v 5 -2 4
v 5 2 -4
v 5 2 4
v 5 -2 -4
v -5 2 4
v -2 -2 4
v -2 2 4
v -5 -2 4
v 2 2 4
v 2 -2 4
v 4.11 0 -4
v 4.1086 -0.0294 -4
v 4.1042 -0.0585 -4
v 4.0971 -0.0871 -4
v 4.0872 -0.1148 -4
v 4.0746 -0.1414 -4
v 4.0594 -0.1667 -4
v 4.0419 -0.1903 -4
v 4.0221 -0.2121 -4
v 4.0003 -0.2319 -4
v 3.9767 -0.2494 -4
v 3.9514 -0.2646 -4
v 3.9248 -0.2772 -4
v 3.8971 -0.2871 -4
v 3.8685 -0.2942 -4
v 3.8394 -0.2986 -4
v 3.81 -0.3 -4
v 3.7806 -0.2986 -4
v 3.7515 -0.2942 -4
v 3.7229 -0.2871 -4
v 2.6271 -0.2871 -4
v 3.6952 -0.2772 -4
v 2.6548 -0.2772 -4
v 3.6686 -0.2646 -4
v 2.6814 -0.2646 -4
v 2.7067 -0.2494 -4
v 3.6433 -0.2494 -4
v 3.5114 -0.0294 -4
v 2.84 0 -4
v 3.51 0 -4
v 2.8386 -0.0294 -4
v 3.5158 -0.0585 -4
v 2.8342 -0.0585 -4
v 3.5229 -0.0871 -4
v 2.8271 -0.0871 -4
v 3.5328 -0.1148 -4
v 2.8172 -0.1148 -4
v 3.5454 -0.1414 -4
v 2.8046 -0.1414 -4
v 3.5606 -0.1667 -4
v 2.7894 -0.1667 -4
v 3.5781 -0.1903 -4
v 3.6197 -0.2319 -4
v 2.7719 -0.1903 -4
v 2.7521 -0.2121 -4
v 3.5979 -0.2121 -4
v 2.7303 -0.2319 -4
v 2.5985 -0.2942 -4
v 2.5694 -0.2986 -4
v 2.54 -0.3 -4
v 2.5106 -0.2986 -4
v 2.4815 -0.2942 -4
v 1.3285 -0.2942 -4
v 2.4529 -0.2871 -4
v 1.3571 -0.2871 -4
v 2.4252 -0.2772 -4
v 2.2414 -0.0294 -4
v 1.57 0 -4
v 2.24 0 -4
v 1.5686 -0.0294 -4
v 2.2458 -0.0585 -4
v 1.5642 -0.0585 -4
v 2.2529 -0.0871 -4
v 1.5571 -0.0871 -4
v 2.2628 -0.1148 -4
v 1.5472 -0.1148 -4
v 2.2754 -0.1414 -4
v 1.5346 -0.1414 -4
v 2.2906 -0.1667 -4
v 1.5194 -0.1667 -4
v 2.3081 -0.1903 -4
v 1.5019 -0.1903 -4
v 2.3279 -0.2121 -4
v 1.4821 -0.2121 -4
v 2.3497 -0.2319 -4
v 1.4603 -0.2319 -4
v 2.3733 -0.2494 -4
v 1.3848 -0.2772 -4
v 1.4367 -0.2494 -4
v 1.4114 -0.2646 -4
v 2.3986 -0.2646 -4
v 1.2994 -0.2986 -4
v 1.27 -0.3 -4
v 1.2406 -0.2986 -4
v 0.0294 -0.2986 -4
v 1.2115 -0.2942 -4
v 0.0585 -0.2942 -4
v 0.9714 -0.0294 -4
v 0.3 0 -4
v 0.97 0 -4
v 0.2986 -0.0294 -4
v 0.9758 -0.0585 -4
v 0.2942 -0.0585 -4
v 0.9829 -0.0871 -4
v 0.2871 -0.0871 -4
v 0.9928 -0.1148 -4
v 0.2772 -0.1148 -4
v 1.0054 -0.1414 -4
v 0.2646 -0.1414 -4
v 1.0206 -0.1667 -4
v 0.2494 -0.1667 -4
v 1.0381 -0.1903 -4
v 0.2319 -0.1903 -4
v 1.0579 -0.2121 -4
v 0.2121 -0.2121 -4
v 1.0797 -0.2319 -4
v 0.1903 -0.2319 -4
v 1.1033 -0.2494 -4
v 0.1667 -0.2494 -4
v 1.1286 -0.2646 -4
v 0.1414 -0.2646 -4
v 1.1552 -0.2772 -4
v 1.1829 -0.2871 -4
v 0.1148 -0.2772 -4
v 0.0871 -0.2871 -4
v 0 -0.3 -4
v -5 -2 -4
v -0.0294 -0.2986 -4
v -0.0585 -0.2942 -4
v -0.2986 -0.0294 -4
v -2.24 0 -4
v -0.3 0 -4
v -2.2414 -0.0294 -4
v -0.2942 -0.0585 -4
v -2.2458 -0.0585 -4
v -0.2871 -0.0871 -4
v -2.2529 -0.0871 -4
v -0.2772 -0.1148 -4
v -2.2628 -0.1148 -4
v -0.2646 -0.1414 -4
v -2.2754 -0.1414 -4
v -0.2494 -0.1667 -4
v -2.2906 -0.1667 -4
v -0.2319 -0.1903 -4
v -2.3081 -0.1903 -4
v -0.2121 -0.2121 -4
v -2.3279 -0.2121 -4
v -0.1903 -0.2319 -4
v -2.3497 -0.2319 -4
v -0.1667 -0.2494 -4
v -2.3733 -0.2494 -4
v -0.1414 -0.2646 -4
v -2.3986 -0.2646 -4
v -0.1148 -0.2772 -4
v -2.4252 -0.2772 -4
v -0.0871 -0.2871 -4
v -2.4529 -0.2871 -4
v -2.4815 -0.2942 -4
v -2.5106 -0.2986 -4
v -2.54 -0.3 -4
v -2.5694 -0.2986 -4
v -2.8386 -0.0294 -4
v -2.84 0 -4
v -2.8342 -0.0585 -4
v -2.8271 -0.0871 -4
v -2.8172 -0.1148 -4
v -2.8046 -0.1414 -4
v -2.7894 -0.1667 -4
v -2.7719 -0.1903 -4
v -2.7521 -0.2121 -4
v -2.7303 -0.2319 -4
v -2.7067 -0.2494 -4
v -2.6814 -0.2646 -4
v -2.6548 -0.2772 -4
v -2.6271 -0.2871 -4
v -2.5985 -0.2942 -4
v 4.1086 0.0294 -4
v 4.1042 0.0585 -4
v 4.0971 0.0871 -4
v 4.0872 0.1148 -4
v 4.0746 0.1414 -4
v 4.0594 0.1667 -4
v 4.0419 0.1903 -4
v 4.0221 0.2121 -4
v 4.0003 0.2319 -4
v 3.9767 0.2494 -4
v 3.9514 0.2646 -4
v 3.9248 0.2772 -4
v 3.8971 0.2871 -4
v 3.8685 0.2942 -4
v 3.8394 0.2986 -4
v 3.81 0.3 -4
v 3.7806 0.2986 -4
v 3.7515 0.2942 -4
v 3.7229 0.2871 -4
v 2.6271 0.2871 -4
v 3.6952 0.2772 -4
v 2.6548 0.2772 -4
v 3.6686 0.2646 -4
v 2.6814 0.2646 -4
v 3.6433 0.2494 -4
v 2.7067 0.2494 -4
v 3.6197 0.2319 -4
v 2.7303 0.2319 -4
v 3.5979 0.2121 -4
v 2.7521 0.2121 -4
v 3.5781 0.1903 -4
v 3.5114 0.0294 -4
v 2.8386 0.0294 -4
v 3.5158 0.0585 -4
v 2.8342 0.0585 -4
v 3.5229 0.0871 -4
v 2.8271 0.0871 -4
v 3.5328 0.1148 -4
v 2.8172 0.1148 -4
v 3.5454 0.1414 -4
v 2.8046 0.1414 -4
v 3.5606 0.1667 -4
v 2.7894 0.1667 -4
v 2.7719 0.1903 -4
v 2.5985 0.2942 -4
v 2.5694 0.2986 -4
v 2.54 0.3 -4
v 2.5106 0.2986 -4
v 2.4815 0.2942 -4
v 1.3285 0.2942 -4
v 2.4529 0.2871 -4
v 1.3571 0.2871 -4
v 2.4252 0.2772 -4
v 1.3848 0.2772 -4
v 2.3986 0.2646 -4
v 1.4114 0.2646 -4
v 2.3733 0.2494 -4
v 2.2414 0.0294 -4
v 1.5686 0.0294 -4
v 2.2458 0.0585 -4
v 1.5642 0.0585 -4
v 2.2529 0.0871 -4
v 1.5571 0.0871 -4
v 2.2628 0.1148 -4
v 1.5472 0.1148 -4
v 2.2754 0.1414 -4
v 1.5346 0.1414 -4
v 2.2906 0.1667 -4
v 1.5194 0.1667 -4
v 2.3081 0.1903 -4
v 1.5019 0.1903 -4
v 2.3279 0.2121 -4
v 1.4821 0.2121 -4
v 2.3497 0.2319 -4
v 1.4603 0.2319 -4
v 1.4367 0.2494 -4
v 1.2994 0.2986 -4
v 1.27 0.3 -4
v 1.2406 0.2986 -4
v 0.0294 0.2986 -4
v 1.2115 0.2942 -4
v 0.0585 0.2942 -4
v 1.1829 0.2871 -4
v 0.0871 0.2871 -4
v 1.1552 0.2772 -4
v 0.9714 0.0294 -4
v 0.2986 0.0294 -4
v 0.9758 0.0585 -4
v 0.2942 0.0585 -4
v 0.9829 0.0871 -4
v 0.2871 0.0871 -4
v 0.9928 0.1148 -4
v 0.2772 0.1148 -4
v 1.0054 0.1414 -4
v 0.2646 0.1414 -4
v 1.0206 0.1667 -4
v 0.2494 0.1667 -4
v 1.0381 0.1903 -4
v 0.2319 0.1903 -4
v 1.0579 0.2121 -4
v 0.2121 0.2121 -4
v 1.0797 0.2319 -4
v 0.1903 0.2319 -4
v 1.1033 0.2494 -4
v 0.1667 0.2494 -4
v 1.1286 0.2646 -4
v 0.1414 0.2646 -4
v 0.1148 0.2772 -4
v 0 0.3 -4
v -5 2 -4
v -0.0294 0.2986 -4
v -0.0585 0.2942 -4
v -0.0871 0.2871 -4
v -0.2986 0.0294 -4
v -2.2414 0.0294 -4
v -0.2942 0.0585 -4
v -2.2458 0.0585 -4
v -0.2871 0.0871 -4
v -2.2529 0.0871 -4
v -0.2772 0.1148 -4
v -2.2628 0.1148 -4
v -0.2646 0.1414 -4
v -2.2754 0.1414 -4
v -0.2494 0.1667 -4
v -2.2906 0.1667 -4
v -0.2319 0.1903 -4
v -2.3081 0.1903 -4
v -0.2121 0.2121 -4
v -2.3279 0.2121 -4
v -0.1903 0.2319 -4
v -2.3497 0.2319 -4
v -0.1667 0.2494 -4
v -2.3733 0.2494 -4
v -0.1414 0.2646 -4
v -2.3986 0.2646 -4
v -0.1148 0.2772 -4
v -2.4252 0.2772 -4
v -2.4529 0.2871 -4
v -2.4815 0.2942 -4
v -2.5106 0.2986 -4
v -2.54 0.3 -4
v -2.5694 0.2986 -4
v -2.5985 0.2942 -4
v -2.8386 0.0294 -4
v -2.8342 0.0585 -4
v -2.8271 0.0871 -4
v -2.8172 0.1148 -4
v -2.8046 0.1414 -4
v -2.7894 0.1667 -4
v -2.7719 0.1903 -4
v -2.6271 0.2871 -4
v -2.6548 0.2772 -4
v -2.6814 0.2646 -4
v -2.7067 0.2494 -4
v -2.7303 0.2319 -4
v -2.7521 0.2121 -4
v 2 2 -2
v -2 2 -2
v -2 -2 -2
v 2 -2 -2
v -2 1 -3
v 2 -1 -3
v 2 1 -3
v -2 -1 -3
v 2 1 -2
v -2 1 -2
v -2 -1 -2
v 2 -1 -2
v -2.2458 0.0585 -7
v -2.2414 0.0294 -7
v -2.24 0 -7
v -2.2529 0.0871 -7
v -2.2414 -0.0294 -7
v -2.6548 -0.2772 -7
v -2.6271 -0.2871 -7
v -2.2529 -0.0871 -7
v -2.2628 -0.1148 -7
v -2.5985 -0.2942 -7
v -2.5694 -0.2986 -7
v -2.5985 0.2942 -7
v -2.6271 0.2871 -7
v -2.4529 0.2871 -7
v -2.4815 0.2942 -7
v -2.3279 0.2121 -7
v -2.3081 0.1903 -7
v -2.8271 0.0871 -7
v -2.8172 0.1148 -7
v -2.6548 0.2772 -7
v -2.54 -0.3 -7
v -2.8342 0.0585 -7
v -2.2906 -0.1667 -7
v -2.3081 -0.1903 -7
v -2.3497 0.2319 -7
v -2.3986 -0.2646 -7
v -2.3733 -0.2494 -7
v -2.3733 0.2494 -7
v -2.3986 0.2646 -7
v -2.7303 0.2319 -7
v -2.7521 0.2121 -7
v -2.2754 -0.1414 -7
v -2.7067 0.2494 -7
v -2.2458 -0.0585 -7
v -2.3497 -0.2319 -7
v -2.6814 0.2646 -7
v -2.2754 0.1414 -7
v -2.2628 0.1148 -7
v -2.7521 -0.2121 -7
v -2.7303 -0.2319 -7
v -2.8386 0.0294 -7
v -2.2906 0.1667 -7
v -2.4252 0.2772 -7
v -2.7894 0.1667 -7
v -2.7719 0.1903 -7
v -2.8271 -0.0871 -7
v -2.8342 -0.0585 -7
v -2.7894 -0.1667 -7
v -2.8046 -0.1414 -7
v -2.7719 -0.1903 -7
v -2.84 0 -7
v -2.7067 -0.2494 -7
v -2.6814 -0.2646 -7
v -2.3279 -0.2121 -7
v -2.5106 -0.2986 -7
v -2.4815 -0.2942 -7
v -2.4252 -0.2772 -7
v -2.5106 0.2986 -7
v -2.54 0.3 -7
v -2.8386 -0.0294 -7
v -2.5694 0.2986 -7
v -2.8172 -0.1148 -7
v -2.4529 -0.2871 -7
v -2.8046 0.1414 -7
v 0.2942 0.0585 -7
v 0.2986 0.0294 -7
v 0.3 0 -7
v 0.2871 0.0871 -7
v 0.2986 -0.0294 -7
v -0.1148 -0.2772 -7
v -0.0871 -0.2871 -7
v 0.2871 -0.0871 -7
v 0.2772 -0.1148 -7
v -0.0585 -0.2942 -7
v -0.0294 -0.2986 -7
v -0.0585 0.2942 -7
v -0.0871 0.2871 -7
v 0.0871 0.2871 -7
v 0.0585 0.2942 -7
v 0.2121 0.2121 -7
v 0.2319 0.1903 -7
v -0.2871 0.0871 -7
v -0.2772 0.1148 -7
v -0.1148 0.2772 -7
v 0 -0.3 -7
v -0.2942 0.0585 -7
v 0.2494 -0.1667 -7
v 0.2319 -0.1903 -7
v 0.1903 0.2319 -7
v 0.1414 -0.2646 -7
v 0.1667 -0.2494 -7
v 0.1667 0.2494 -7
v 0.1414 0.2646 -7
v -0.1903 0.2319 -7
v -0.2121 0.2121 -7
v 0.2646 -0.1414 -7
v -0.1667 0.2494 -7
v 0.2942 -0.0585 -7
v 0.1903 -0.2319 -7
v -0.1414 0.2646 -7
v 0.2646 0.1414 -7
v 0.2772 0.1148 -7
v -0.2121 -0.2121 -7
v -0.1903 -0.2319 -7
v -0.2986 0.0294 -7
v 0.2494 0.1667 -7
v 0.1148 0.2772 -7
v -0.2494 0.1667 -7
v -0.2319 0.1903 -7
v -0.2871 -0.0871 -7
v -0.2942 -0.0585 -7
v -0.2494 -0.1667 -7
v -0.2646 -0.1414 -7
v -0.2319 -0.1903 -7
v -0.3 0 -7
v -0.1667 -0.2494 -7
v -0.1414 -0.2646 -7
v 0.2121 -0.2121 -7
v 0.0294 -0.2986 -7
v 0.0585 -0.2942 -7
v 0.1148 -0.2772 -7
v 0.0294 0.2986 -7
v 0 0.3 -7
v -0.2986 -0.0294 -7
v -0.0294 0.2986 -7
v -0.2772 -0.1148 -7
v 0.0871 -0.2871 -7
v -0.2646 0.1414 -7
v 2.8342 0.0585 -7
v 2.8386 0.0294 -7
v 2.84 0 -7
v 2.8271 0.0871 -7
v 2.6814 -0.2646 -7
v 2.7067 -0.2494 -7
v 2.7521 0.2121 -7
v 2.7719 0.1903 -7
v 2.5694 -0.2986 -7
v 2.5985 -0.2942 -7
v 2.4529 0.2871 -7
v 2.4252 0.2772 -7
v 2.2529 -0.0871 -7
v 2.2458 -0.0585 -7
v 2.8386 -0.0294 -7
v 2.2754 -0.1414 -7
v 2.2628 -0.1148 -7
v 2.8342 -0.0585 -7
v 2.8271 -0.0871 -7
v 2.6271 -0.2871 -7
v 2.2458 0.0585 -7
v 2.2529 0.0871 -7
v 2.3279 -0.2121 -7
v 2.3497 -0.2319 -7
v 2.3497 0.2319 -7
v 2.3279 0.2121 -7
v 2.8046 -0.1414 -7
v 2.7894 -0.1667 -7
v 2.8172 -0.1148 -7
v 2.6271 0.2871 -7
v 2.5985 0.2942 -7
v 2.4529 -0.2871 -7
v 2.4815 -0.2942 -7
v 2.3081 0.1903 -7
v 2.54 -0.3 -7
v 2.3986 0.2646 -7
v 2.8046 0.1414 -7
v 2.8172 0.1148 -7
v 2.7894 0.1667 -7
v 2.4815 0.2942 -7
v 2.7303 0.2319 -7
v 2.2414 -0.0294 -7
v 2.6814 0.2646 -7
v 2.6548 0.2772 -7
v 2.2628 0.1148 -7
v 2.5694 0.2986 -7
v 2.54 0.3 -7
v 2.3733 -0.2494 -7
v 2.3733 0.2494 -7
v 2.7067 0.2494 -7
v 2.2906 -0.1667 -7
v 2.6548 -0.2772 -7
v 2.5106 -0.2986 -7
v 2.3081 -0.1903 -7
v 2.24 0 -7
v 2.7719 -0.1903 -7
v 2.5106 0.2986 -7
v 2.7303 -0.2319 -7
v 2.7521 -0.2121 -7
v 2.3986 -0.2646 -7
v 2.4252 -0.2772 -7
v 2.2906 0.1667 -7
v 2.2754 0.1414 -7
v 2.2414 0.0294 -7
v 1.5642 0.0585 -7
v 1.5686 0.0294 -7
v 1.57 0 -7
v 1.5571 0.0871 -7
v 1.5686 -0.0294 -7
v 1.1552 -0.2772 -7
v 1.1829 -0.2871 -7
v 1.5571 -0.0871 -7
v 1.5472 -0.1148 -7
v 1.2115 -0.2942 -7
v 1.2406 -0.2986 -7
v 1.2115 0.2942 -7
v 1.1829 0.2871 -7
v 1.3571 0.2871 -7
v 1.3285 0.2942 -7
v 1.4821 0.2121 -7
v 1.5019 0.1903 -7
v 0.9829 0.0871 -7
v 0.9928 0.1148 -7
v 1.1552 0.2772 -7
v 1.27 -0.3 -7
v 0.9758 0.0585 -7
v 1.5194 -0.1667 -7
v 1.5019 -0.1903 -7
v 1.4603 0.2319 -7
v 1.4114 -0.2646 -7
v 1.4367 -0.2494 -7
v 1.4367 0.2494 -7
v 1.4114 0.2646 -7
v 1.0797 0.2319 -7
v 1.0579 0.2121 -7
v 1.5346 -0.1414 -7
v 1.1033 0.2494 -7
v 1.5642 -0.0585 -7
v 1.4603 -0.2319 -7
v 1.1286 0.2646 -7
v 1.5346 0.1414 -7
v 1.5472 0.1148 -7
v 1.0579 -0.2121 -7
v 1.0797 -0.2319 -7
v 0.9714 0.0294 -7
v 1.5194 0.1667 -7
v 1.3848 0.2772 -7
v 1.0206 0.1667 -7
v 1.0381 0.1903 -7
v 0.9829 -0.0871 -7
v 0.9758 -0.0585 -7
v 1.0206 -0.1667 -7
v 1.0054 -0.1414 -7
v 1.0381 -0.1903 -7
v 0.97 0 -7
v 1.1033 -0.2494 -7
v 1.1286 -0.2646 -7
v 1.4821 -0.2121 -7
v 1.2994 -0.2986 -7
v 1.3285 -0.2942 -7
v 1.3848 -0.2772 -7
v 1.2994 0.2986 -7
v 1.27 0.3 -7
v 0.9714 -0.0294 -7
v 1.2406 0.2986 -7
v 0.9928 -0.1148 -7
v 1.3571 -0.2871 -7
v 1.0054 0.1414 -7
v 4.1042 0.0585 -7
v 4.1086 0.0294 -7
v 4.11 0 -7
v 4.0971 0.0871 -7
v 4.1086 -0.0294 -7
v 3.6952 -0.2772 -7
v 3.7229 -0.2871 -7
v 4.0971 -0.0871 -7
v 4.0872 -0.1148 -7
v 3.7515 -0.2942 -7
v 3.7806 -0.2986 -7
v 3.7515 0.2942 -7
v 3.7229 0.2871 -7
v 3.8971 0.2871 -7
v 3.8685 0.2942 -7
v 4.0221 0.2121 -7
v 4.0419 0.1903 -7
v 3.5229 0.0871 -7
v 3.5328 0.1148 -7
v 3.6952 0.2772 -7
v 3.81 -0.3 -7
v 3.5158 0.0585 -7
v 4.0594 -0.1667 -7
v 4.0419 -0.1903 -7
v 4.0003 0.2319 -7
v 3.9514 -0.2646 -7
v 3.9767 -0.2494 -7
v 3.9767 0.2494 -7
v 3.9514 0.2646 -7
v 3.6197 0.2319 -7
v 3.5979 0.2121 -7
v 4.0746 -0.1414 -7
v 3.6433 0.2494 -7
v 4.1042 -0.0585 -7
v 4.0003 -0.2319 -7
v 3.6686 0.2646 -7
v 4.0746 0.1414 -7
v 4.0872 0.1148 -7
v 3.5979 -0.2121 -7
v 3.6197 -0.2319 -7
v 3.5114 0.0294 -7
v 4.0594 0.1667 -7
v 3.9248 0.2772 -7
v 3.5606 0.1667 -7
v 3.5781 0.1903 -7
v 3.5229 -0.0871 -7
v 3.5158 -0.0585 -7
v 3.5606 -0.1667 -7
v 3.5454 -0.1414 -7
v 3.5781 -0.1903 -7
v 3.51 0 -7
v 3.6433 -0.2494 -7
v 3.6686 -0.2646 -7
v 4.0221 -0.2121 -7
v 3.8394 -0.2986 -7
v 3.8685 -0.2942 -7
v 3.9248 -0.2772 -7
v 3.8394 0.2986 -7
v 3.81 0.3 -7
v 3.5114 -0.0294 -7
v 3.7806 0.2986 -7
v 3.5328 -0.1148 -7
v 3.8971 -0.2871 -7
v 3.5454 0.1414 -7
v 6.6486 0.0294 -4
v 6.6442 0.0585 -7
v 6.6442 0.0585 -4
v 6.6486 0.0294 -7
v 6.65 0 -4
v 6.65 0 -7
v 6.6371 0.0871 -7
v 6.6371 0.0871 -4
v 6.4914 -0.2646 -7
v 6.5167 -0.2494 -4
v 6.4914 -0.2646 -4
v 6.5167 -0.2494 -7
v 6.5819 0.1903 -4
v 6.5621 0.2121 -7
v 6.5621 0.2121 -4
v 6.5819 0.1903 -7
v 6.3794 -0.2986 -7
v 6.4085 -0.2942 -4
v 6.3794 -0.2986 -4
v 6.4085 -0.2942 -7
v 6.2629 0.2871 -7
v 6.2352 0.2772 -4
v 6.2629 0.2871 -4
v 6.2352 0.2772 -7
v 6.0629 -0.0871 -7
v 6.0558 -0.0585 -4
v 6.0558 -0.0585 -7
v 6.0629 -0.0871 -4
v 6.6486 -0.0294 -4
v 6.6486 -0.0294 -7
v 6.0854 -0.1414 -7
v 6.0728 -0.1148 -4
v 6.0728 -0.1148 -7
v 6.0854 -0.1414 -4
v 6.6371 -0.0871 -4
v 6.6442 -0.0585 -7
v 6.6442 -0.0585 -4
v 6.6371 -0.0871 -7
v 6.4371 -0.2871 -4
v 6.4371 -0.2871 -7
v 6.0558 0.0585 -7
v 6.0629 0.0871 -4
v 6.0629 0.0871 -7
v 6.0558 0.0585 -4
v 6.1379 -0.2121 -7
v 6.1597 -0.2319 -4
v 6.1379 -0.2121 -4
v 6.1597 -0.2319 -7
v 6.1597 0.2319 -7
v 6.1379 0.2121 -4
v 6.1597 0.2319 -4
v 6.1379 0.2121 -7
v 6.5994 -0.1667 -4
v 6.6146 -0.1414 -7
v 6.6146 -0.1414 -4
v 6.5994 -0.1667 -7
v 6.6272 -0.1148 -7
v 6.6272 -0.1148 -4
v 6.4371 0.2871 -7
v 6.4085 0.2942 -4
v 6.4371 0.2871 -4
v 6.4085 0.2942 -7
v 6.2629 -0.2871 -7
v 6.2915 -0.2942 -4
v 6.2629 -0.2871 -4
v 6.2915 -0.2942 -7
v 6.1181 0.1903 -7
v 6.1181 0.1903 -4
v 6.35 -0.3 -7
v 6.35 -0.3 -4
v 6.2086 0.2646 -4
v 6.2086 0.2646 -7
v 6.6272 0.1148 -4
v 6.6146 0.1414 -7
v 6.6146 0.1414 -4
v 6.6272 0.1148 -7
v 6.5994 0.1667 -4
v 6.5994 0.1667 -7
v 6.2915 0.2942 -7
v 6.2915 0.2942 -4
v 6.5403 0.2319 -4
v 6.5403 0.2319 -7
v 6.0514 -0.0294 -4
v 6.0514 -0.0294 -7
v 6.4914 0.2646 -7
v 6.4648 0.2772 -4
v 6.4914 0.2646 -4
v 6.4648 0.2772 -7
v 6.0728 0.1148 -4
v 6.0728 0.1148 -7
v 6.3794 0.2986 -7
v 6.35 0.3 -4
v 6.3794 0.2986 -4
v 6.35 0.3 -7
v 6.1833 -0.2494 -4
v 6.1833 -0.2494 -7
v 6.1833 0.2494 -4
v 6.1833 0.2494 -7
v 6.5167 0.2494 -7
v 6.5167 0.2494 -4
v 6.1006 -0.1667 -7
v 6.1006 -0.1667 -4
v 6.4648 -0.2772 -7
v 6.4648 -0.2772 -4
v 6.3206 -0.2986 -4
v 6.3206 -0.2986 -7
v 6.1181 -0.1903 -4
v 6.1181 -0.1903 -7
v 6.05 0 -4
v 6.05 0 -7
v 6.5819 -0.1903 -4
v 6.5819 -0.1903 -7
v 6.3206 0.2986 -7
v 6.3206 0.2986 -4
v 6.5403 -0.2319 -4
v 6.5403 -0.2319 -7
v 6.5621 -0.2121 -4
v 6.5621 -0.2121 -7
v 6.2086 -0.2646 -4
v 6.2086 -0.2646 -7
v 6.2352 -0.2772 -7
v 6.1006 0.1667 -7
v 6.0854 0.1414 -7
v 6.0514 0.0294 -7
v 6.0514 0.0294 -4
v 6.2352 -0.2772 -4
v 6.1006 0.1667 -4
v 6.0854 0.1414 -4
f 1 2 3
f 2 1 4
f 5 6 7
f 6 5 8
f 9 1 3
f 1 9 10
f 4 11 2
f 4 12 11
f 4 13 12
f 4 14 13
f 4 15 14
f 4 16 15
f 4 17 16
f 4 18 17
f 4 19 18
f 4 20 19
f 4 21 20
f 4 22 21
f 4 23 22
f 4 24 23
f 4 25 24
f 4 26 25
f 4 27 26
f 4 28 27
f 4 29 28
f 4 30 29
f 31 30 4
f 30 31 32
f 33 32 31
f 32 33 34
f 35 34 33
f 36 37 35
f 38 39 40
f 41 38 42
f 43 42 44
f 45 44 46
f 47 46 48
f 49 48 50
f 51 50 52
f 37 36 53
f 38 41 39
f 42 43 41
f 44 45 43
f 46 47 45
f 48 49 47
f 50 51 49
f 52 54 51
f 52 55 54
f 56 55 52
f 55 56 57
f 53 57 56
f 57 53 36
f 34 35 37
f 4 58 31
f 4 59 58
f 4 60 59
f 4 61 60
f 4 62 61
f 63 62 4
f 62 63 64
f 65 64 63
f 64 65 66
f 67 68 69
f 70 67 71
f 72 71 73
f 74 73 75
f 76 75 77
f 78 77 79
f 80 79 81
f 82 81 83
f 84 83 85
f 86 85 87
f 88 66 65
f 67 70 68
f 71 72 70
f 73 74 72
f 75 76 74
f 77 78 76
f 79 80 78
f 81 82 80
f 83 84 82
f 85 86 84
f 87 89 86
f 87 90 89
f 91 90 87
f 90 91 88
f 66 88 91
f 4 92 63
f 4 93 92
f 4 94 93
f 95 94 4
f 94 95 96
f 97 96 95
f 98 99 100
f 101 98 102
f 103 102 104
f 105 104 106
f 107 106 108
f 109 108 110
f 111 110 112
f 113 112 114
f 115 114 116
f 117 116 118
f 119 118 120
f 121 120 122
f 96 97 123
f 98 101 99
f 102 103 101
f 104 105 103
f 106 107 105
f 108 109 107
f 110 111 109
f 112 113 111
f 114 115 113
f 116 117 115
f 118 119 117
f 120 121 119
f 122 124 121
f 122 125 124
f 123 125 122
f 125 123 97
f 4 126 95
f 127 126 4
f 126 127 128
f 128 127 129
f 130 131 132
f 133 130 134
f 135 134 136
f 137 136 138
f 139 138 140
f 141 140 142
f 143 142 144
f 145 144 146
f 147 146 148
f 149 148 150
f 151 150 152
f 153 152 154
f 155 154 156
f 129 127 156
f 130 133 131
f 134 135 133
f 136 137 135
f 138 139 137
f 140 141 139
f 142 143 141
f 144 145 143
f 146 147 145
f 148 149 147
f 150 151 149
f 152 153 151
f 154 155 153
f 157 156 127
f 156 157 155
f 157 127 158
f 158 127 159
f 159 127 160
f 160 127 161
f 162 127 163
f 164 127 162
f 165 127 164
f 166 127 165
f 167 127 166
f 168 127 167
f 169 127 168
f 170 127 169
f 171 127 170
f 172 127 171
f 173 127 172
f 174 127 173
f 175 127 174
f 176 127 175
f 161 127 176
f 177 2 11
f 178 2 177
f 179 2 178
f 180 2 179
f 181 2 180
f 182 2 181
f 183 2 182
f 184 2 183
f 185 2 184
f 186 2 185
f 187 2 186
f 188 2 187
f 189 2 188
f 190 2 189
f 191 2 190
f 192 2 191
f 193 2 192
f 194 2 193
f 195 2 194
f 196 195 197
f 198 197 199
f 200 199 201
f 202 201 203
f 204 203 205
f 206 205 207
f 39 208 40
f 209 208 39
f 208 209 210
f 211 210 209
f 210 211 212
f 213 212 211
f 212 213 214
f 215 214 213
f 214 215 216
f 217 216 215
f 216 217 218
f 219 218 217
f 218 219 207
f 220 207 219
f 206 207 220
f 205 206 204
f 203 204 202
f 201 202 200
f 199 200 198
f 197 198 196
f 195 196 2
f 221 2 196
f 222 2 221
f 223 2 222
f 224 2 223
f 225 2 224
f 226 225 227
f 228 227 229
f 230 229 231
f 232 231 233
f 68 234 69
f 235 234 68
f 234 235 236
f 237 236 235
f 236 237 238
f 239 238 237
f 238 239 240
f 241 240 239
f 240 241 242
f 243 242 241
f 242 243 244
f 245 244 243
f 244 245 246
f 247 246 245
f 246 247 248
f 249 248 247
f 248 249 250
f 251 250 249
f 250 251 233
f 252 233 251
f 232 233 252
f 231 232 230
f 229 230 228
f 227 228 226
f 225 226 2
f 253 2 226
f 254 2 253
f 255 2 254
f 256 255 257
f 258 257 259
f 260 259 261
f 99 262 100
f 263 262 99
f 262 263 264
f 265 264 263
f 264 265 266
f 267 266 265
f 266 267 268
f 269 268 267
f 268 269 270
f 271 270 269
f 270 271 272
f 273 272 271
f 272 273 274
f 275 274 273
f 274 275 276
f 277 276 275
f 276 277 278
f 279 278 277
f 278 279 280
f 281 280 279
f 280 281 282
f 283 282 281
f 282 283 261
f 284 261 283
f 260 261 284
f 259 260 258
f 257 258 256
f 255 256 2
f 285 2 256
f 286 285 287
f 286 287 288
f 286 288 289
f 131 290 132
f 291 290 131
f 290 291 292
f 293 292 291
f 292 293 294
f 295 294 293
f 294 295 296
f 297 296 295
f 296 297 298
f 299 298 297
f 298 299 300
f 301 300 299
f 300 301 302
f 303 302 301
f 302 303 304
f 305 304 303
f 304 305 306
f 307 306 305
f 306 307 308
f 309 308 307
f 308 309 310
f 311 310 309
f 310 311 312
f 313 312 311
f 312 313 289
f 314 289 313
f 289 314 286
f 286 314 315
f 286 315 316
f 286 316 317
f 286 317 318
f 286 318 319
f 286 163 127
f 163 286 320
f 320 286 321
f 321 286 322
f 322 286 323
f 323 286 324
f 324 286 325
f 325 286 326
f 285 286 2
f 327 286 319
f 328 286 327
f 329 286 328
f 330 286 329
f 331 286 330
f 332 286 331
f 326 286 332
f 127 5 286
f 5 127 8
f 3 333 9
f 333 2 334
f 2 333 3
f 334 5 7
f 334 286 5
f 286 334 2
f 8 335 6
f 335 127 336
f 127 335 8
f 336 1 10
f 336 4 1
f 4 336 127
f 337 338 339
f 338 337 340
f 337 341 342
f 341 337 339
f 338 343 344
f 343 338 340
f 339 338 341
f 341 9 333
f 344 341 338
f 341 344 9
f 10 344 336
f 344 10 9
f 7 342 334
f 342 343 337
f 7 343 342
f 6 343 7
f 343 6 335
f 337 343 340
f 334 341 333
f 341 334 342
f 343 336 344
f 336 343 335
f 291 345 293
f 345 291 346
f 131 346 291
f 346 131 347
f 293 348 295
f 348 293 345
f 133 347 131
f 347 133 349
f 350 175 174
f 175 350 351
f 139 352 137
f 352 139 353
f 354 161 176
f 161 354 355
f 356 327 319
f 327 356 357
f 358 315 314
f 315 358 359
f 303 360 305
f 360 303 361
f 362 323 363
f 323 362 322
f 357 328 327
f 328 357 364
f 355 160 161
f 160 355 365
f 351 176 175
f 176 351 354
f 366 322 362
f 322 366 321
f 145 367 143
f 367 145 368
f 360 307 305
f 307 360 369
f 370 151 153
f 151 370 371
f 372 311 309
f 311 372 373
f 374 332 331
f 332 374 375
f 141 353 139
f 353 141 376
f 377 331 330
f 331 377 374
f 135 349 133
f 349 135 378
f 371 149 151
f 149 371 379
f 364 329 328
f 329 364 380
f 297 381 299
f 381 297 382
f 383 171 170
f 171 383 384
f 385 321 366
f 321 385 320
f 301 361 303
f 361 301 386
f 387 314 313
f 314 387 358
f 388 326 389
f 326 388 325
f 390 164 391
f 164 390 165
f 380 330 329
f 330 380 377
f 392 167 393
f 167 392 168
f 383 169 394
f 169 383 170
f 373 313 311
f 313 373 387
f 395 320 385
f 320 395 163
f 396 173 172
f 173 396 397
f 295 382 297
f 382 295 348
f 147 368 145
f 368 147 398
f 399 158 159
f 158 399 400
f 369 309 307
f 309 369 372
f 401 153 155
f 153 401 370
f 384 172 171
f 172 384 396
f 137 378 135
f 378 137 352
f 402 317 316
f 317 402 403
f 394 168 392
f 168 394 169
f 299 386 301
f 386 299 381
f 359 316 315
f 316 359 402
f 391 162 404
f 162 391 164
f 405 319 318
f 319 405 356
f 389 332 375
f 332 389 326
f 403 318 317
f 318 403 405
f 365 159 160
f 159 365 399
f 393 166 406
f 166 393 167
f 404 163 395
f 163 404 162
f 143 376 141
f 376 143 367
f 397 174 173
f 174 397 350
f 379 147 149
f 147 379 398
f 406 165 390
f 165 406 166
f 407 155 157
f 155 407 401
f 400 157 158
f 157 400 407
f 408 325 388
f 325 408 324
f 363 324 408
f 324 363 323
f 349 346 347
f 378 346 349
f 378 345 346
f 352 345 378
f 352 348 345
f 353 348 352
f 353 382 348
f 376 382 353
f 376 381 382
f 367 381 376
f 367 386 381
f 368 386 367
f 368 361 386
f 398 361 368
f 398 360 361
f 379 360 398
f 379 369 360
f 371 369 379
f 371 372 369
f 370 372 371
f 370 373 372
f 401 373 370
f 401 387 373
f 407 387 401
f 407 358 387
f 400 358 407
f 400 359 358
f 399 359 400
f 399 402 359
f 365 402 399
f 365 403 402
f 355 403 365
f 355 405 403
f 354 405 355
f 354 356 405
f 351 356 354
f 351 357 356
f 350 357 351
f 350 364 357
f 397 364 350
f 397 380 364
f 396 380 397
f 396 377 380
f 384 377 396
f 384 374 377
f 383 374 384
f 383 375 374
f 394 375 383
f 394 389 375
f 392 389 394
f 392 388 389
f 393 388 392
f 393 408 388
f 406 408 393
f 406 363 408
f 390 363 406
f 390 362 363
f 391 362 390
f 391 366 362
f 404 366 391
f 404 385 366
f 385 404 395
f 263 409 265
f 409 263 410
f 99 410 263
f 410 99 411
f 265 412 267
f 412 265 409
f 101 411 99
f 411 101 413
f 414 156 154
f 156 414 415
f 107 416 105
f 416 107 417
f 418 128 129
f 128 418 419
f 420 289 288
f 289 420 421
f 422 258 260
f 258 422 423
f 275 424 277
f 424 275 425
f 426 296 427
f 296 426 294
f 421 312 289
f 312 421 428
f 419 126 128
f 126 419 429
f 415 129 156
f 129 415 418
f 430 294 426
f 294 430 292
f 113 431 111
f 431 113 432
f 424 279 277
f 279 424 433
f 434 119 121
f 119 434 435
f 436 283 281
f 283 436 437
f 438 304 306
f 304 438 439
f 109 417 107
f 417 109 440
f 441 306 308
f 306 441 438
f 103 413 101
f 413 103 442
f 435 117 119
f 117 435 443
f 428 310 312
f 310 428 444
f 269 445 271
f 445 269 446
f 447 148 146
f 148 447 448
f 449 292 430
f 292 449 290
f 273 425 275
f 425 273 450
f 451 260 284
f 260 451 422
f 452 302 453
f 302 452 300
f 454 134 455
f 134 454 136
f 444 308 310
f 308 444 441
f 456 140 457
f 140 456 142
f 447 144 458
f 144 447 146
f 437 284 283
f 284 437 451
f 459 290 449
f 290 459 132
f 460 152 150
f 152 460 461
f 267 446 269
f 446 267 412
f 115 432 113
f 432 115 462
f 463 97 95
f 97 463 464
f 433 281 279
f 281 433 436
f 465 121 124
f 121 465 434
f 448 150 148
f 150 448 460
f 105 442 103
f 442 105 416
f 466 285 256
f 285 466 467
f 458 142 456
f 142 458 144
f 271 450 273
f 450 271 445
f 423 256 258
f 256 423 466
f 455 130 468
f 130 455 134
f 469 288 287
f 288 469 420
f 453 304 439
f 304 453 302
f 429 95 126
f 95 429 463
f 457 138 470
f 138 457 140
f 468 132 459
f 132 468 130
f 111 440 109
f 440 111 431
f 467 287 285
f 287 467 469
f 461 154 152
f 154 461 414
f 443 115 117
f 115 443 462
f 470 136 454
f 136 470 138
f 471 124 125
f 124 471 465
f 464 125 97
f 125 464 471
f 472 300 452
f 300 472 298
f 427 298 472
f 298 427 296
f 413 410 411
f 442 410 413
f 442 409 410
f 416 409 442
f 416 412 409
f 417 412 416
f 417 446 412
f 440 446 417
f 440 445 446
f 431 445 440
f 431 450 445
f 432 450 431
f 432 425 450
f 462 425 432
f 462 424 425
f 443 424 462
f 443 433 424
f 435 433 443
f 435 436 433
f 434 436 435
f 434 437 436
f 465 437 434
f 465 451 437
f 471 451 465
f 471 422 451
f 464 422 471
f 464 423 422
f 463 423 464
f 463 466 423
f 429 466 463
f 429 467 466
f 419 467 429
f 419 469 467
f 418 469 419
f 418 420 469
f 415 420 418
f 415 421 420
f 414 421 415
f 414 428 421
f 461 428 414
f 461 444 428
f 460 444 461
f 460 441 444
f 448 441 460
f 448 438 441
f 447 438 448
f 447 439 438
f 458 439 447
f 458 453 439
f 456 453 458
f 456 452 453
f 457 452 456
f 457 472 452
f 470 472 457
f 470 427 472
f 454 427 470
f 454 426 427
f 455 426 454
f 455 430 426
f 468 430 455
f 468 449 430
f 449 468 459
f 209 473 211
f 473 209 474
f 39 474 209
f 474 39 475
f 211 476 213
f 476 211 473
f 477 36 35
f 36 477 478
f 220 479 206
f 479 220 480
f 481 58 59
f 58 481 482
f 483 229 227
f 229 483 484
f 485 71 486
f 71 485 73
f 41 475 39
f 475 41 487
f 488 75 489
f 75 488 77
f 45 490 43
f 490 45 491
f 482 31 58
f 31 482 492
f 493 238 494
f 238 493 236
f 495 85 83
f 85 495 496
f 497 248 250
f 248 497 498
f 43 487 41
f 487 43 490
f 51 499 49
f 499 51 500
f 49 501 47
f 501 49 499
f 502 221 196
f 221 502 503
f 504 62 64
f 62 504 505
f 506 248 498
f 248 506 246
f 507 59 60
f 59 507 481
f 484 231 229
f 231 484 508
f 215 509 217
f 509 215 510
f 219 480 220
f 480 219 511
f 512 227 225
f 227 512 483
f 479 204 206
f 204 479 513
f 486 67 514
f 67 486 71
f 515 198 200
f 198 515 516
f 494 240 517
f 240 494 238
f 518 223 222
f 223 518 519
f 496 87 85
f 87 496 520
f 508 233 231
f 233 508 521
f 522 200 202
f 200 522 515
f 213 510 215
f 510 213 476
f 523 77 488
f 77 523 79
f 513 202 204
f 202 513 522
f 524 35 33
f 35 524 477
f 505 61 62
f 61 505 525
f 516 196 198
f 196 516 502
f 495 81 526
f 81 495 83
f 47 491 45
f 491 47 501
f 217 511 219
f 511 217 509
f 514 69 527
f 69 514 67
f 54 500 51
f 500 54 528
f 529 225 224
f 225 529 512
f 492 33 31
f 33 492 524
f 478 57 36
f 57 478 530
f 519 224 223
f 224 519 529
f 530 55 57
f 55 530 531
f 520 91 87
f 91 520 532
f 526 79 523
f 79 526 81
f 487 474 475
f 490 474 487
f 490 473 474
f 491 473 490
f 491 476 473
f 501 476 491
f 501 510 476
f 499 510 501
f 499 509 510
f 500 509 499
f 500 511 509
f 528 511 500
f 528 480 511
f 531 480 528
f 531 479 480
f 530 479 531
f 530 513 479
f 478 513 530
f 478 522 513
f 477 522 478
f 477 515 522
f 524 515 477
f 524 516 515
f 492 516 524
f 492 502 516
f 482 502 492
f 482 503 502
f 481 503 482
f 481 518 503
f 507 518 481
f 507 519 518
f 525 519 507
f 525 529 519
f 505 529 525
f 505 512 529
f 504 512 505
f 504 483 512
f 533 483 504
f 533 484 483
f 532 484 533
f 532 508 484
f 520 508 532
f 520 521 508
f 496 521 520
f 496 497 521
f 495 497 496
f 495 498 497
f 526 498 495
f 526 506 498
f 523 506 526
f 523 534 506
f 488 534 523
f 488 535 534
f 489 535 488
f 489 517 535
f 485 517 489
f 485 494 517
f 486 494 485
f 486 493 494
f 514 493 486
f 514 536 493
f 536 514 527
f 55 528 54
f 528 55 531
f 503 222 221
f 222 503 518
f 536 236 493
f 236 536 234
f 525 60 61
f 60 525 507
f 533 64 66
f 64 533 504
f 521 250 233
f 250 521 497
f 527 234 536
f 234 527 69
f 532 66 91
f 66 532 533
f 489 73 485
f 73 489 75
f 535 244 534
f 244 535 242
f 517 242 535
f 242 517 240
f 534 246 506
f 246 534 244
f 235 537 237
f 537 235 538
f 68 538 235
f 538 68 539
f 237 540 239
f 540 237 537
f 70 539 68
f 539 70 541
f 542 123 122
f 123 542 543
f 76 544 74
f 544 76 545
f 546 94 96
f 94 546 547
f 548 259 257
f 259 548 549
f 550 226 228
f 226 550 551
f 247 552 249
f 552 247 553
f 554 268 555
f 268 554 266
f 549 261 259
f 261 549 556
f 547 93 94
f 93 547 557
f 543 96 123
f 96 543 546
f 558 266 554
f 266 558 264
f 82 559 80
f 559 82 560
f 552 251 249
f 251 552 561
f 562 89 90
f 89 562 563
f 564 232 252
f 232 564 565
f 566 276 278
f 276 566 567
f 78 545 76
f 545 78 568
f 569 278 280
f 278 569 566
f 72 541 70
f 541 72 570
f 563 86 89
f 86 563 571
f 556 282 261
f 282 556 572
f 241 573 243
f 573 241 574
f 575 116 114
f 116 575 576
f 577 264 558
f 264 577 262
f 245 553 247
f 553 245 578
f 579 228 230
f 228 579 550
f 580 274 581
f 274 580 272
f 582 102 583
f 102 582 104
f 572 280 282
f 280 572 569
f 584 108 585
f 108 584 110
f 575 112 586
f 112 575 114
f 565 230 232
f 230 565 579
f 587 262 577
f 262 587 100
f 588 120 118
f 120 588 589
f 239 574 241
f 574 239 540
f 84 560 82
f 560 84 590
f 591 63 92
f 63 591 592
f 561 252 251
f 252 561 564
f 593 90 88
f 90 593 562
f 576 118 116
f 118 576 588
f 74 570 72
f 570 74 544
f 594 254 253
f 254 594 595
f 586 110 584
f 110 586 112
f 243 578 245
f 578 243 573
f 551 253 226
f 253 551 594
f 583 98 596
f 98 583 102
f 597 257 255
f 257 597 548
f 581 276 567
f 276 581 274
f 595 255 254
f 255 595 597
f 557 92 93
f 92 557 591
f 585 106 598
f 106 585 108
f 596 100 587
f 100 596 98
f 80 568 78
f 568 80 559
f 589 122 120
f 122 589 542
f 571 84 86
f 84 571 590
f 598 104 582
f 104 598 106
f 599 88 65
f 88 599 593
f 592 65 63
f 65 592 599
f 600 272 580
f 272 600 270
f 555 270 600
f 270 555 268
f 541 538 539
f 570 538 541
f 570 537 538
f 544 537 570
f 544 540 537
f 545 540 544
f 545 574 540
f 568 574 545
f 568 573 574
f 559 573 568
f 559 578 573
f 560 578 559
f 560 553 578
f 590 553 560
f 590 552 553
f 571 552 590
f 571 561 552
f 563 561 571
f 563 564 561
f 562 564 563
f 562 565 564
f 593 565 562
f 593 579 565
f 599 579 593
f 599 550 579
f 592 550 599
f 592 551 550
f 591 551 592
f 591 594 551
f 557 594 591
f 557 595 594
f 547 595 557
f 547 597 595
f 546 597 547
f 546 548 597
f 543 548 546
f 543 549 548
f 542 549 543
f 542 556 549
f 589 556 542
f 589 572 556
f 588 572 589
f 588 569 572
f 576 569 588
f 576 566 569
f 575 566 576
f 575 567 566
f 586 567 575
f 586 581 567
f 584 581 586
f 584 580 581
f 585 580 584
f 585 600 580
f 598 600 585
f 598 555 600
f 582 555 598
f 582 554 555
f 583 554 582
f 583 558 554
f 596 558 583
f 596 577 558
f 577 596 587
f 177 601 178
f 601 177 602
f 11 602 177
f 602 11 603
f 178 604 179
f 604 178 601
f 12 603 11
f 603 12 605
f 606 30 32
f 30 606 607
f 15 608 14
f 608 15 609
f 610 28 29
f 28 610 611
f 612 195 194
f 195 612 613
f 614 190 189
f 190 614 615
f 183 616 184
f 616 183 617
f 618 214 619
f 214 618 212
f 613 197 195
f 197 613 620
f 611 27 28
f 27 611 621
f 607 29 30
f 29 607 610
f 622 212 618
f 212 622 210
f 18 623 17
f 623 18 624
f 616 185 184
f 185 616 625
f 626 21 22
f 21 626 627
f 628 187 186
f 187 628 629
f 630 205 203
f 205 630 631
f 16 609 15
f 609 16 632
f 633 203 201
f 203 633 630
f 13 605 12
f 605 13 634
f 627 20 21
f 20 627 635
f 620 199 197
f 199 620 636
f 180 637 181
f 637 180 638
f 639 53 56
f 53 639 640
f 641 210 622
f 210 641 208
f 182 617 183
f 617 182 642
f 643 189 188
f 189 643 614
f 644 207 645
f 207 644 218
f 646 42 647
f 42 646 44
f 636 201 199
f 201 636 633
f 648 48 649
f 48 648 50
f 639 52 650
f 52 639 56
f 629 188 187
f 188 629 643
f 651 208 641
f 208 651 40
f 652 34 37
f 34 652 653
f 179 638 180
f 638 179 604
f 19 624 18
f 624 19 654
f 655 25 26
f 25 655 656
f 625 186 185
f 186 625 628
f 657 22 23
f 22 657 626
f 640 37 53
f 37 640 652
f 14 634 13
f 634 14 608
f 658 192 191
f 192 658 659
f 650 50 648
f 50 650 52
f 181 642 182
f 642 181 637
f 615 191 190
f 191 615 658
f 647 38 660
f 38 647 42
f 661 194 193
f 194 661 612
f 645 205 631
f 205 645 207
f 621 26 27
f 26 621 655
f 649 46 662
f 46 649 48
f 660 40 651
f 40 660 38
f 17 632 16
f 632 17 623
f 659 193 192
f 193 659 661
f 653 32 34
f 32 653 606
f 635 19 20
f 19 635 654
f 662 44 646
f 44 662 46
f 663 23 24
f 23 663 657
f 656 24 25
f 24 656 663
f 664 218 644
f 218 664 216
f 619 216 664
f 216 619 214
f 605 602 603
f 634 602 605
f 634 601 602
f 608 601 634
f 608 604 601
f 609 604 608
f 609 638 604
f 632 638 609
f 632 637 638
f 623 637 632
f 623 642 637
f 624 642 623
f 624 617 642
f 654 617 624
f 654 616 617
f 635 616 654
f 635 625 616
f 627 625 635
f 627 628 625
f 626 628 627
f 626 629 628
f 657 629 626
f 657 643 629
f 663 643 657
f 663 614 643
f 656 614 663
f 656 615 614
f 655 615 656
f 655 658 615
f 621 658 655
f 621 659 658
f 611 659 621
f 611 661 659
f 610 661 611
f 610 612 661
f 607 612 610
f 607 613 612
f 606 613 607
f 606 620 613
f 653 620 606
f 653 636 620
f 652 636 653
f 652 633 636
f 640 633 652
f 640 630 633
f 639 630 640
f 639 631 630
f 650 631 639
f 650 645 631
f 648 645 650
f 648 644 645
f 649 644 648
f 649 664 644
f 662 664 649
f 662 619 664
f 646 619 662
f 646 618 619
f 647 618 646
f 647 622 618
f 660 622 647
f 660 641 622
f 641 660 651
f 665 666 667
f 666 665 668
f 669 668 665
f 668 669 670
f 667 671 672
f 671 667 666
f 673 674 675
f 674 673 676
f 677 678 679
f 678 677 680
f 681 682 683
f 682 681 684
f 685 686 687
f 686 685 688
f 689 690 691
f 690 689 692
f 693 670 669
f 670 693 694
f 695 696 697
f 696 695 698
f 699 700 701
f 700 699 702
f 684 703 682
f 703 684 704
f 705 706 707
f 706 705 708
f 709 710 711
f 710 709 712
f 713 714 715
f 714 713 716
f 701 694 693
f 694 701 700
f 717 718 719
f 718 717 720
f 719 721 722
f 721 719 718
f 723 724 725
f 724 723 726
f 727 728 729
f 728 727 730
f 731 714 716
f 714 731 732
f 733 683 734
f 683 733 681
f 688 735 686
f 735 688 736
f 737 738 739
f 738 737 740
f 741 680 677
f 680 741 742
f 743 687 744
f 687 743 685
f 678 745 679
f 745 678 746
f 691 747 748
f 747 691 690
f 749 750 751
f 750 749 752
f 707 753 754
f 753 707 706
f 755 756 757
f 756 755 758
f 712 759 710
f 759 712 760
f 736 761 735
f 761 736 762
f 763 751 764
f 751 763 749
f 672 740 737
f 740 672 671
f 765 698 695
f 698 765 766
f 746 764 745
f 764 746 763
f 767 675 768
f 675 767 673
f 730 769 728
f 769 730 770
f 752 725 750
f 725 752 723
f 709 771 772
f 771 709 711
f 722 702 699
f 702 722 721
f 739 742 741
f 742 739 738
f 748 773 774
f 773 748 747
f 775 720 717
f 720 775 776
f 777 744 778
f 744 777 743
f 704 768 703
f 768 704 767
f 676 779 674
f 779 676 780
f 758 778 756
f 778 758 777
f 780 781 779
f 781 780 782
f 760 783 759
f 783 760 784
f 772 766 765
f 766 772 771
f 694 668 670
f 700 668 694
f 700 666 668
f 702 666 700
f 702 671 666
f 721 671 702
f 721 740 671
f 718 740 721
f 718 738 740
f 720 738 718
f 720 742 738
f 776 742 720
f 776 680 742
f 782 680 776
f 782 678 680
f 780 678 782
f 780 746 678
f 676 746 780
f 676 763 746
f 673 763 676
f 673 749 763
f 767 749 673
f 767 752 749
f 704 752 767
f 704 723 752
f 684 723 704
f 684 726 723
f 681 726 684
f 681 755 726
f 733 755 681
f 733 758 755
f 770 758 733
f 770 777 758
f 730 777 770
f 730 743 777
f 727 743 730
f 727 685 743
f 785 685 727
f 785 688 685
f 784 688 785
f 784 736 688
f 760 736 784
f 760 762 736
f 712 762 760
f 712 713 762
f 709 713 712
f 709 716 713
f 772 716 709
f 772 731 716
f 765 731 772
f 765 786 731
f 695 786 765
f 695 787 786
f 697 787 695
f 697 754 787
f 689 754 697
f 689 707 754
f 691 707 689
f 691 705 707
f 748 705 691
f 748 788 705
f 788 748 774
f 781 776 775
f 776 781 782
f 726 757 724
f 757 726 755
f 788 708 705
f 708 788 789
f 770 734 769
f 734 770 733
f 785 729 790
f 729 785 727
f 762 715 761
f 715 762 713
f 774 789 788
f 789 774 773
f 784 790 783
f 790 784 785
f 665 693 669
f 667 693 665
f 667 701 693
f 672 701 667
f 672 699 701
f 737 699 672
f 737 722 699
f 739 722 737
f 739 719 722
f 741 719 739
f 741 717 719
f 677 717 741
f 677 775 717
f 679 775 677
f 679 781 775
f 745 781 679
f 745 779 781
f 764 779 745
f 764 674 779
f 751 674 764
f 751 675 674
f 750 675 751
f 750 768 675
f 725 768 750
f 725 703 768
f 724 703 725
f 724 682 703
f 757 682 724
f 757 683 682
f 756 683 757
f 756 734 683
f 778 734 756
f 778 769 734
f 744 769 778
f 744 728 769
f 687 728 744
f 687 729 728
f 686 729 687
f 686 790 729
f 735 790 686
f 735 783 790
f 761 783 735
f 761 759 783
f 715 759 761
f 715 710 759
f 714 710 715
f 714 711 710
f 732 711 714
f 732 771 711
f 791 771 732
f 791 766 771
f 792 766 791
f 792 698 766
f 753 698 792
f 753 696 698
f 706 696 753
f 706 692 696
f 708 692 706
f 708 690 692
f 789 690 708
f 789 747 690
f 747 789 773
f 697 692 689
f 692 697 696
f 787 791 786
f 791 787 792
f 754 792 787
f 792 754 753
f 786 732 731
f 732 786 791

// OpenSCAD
$fn=64;

module pin(d=0.6, h=3.0){
    cylinder(d=d, h=h, center=false);
}

module pins_row(count=3, pitch=2.54, d=0.6, h=3.0){
    for(i=[0:count-1]){
        translate([i*pitch, 0, 0]) pin(d=d, h=h);
    }
}

module photo_interrupter_body(
    body_w=10.0,
    body_d=4.0,
    body_h=8.0,
    slot_w=3.0,
    slot_d=2.0,
    slot_h=6.0,
    gap_w=4.0,
    gap_d=2.0,
    gap_h=6.0,
    top_relief_h=1.2
){
    difference(){
        union(){
            translate([0,0,body_h/2]) cube([body_w, body_d, body_h], center=true);

            translate([0,0,body_h - top_relief_h/2])
                cube([body_w*0.9, body_d*0.9, top_relief_h], center=true);

            translate([0,0,body_h/2])
                cube([body_w, body_d, body_h], center=true);
        }

        translate([0,0,slot_h/2 + 1.0])
            cube([slot_w, slot_d, slot_h], center=true);

        translate([0,0,gap_h/2 + 1.0])
            cube([gap_w, gap_d, gap_h], center=true);

        translate([0,0,body_h/2 + 1.0])
            cube([gap_w, body_d+0.2, gap_h], center=true);
    }
}

module photo_interrupter(
    body_w=10.0,
    body_d=4.0,
    body_h=8.0,
    pin_pitch=2.54,
    pin_d=0.6,
    pin_h=3.0,
    pin_offset_y=0.0,
    pin_z=0.0
){
    union(){
        translate([0,0,pin_h])
            photo_interrupter_body(
                body_w=body_w,
                body_d=body_d,
                body_h=body_h,
                slot_w=3.0,
                slot_d=2.0,
                slot_h=6.0,
                gap_w=4.0,
                gap_d=2.0,
                gap_h=6.0,
                top_relief_h=1.2
            );

        translate([-pin_pitch, pin_offset_y, pin_z])
            pins_row(count=3, pitch=pin_pitch, d=pin_d, h=pin_h);

        translate([pin_pitch*0.5, pin_offset_y, pin_z])
            pins_row(count=3, pitch=pin_pitch, d=pin_d, h=pin_h);
    }
}

translate([0,0,-(3.0 + 8.0/2)]) photo_interrupter();
